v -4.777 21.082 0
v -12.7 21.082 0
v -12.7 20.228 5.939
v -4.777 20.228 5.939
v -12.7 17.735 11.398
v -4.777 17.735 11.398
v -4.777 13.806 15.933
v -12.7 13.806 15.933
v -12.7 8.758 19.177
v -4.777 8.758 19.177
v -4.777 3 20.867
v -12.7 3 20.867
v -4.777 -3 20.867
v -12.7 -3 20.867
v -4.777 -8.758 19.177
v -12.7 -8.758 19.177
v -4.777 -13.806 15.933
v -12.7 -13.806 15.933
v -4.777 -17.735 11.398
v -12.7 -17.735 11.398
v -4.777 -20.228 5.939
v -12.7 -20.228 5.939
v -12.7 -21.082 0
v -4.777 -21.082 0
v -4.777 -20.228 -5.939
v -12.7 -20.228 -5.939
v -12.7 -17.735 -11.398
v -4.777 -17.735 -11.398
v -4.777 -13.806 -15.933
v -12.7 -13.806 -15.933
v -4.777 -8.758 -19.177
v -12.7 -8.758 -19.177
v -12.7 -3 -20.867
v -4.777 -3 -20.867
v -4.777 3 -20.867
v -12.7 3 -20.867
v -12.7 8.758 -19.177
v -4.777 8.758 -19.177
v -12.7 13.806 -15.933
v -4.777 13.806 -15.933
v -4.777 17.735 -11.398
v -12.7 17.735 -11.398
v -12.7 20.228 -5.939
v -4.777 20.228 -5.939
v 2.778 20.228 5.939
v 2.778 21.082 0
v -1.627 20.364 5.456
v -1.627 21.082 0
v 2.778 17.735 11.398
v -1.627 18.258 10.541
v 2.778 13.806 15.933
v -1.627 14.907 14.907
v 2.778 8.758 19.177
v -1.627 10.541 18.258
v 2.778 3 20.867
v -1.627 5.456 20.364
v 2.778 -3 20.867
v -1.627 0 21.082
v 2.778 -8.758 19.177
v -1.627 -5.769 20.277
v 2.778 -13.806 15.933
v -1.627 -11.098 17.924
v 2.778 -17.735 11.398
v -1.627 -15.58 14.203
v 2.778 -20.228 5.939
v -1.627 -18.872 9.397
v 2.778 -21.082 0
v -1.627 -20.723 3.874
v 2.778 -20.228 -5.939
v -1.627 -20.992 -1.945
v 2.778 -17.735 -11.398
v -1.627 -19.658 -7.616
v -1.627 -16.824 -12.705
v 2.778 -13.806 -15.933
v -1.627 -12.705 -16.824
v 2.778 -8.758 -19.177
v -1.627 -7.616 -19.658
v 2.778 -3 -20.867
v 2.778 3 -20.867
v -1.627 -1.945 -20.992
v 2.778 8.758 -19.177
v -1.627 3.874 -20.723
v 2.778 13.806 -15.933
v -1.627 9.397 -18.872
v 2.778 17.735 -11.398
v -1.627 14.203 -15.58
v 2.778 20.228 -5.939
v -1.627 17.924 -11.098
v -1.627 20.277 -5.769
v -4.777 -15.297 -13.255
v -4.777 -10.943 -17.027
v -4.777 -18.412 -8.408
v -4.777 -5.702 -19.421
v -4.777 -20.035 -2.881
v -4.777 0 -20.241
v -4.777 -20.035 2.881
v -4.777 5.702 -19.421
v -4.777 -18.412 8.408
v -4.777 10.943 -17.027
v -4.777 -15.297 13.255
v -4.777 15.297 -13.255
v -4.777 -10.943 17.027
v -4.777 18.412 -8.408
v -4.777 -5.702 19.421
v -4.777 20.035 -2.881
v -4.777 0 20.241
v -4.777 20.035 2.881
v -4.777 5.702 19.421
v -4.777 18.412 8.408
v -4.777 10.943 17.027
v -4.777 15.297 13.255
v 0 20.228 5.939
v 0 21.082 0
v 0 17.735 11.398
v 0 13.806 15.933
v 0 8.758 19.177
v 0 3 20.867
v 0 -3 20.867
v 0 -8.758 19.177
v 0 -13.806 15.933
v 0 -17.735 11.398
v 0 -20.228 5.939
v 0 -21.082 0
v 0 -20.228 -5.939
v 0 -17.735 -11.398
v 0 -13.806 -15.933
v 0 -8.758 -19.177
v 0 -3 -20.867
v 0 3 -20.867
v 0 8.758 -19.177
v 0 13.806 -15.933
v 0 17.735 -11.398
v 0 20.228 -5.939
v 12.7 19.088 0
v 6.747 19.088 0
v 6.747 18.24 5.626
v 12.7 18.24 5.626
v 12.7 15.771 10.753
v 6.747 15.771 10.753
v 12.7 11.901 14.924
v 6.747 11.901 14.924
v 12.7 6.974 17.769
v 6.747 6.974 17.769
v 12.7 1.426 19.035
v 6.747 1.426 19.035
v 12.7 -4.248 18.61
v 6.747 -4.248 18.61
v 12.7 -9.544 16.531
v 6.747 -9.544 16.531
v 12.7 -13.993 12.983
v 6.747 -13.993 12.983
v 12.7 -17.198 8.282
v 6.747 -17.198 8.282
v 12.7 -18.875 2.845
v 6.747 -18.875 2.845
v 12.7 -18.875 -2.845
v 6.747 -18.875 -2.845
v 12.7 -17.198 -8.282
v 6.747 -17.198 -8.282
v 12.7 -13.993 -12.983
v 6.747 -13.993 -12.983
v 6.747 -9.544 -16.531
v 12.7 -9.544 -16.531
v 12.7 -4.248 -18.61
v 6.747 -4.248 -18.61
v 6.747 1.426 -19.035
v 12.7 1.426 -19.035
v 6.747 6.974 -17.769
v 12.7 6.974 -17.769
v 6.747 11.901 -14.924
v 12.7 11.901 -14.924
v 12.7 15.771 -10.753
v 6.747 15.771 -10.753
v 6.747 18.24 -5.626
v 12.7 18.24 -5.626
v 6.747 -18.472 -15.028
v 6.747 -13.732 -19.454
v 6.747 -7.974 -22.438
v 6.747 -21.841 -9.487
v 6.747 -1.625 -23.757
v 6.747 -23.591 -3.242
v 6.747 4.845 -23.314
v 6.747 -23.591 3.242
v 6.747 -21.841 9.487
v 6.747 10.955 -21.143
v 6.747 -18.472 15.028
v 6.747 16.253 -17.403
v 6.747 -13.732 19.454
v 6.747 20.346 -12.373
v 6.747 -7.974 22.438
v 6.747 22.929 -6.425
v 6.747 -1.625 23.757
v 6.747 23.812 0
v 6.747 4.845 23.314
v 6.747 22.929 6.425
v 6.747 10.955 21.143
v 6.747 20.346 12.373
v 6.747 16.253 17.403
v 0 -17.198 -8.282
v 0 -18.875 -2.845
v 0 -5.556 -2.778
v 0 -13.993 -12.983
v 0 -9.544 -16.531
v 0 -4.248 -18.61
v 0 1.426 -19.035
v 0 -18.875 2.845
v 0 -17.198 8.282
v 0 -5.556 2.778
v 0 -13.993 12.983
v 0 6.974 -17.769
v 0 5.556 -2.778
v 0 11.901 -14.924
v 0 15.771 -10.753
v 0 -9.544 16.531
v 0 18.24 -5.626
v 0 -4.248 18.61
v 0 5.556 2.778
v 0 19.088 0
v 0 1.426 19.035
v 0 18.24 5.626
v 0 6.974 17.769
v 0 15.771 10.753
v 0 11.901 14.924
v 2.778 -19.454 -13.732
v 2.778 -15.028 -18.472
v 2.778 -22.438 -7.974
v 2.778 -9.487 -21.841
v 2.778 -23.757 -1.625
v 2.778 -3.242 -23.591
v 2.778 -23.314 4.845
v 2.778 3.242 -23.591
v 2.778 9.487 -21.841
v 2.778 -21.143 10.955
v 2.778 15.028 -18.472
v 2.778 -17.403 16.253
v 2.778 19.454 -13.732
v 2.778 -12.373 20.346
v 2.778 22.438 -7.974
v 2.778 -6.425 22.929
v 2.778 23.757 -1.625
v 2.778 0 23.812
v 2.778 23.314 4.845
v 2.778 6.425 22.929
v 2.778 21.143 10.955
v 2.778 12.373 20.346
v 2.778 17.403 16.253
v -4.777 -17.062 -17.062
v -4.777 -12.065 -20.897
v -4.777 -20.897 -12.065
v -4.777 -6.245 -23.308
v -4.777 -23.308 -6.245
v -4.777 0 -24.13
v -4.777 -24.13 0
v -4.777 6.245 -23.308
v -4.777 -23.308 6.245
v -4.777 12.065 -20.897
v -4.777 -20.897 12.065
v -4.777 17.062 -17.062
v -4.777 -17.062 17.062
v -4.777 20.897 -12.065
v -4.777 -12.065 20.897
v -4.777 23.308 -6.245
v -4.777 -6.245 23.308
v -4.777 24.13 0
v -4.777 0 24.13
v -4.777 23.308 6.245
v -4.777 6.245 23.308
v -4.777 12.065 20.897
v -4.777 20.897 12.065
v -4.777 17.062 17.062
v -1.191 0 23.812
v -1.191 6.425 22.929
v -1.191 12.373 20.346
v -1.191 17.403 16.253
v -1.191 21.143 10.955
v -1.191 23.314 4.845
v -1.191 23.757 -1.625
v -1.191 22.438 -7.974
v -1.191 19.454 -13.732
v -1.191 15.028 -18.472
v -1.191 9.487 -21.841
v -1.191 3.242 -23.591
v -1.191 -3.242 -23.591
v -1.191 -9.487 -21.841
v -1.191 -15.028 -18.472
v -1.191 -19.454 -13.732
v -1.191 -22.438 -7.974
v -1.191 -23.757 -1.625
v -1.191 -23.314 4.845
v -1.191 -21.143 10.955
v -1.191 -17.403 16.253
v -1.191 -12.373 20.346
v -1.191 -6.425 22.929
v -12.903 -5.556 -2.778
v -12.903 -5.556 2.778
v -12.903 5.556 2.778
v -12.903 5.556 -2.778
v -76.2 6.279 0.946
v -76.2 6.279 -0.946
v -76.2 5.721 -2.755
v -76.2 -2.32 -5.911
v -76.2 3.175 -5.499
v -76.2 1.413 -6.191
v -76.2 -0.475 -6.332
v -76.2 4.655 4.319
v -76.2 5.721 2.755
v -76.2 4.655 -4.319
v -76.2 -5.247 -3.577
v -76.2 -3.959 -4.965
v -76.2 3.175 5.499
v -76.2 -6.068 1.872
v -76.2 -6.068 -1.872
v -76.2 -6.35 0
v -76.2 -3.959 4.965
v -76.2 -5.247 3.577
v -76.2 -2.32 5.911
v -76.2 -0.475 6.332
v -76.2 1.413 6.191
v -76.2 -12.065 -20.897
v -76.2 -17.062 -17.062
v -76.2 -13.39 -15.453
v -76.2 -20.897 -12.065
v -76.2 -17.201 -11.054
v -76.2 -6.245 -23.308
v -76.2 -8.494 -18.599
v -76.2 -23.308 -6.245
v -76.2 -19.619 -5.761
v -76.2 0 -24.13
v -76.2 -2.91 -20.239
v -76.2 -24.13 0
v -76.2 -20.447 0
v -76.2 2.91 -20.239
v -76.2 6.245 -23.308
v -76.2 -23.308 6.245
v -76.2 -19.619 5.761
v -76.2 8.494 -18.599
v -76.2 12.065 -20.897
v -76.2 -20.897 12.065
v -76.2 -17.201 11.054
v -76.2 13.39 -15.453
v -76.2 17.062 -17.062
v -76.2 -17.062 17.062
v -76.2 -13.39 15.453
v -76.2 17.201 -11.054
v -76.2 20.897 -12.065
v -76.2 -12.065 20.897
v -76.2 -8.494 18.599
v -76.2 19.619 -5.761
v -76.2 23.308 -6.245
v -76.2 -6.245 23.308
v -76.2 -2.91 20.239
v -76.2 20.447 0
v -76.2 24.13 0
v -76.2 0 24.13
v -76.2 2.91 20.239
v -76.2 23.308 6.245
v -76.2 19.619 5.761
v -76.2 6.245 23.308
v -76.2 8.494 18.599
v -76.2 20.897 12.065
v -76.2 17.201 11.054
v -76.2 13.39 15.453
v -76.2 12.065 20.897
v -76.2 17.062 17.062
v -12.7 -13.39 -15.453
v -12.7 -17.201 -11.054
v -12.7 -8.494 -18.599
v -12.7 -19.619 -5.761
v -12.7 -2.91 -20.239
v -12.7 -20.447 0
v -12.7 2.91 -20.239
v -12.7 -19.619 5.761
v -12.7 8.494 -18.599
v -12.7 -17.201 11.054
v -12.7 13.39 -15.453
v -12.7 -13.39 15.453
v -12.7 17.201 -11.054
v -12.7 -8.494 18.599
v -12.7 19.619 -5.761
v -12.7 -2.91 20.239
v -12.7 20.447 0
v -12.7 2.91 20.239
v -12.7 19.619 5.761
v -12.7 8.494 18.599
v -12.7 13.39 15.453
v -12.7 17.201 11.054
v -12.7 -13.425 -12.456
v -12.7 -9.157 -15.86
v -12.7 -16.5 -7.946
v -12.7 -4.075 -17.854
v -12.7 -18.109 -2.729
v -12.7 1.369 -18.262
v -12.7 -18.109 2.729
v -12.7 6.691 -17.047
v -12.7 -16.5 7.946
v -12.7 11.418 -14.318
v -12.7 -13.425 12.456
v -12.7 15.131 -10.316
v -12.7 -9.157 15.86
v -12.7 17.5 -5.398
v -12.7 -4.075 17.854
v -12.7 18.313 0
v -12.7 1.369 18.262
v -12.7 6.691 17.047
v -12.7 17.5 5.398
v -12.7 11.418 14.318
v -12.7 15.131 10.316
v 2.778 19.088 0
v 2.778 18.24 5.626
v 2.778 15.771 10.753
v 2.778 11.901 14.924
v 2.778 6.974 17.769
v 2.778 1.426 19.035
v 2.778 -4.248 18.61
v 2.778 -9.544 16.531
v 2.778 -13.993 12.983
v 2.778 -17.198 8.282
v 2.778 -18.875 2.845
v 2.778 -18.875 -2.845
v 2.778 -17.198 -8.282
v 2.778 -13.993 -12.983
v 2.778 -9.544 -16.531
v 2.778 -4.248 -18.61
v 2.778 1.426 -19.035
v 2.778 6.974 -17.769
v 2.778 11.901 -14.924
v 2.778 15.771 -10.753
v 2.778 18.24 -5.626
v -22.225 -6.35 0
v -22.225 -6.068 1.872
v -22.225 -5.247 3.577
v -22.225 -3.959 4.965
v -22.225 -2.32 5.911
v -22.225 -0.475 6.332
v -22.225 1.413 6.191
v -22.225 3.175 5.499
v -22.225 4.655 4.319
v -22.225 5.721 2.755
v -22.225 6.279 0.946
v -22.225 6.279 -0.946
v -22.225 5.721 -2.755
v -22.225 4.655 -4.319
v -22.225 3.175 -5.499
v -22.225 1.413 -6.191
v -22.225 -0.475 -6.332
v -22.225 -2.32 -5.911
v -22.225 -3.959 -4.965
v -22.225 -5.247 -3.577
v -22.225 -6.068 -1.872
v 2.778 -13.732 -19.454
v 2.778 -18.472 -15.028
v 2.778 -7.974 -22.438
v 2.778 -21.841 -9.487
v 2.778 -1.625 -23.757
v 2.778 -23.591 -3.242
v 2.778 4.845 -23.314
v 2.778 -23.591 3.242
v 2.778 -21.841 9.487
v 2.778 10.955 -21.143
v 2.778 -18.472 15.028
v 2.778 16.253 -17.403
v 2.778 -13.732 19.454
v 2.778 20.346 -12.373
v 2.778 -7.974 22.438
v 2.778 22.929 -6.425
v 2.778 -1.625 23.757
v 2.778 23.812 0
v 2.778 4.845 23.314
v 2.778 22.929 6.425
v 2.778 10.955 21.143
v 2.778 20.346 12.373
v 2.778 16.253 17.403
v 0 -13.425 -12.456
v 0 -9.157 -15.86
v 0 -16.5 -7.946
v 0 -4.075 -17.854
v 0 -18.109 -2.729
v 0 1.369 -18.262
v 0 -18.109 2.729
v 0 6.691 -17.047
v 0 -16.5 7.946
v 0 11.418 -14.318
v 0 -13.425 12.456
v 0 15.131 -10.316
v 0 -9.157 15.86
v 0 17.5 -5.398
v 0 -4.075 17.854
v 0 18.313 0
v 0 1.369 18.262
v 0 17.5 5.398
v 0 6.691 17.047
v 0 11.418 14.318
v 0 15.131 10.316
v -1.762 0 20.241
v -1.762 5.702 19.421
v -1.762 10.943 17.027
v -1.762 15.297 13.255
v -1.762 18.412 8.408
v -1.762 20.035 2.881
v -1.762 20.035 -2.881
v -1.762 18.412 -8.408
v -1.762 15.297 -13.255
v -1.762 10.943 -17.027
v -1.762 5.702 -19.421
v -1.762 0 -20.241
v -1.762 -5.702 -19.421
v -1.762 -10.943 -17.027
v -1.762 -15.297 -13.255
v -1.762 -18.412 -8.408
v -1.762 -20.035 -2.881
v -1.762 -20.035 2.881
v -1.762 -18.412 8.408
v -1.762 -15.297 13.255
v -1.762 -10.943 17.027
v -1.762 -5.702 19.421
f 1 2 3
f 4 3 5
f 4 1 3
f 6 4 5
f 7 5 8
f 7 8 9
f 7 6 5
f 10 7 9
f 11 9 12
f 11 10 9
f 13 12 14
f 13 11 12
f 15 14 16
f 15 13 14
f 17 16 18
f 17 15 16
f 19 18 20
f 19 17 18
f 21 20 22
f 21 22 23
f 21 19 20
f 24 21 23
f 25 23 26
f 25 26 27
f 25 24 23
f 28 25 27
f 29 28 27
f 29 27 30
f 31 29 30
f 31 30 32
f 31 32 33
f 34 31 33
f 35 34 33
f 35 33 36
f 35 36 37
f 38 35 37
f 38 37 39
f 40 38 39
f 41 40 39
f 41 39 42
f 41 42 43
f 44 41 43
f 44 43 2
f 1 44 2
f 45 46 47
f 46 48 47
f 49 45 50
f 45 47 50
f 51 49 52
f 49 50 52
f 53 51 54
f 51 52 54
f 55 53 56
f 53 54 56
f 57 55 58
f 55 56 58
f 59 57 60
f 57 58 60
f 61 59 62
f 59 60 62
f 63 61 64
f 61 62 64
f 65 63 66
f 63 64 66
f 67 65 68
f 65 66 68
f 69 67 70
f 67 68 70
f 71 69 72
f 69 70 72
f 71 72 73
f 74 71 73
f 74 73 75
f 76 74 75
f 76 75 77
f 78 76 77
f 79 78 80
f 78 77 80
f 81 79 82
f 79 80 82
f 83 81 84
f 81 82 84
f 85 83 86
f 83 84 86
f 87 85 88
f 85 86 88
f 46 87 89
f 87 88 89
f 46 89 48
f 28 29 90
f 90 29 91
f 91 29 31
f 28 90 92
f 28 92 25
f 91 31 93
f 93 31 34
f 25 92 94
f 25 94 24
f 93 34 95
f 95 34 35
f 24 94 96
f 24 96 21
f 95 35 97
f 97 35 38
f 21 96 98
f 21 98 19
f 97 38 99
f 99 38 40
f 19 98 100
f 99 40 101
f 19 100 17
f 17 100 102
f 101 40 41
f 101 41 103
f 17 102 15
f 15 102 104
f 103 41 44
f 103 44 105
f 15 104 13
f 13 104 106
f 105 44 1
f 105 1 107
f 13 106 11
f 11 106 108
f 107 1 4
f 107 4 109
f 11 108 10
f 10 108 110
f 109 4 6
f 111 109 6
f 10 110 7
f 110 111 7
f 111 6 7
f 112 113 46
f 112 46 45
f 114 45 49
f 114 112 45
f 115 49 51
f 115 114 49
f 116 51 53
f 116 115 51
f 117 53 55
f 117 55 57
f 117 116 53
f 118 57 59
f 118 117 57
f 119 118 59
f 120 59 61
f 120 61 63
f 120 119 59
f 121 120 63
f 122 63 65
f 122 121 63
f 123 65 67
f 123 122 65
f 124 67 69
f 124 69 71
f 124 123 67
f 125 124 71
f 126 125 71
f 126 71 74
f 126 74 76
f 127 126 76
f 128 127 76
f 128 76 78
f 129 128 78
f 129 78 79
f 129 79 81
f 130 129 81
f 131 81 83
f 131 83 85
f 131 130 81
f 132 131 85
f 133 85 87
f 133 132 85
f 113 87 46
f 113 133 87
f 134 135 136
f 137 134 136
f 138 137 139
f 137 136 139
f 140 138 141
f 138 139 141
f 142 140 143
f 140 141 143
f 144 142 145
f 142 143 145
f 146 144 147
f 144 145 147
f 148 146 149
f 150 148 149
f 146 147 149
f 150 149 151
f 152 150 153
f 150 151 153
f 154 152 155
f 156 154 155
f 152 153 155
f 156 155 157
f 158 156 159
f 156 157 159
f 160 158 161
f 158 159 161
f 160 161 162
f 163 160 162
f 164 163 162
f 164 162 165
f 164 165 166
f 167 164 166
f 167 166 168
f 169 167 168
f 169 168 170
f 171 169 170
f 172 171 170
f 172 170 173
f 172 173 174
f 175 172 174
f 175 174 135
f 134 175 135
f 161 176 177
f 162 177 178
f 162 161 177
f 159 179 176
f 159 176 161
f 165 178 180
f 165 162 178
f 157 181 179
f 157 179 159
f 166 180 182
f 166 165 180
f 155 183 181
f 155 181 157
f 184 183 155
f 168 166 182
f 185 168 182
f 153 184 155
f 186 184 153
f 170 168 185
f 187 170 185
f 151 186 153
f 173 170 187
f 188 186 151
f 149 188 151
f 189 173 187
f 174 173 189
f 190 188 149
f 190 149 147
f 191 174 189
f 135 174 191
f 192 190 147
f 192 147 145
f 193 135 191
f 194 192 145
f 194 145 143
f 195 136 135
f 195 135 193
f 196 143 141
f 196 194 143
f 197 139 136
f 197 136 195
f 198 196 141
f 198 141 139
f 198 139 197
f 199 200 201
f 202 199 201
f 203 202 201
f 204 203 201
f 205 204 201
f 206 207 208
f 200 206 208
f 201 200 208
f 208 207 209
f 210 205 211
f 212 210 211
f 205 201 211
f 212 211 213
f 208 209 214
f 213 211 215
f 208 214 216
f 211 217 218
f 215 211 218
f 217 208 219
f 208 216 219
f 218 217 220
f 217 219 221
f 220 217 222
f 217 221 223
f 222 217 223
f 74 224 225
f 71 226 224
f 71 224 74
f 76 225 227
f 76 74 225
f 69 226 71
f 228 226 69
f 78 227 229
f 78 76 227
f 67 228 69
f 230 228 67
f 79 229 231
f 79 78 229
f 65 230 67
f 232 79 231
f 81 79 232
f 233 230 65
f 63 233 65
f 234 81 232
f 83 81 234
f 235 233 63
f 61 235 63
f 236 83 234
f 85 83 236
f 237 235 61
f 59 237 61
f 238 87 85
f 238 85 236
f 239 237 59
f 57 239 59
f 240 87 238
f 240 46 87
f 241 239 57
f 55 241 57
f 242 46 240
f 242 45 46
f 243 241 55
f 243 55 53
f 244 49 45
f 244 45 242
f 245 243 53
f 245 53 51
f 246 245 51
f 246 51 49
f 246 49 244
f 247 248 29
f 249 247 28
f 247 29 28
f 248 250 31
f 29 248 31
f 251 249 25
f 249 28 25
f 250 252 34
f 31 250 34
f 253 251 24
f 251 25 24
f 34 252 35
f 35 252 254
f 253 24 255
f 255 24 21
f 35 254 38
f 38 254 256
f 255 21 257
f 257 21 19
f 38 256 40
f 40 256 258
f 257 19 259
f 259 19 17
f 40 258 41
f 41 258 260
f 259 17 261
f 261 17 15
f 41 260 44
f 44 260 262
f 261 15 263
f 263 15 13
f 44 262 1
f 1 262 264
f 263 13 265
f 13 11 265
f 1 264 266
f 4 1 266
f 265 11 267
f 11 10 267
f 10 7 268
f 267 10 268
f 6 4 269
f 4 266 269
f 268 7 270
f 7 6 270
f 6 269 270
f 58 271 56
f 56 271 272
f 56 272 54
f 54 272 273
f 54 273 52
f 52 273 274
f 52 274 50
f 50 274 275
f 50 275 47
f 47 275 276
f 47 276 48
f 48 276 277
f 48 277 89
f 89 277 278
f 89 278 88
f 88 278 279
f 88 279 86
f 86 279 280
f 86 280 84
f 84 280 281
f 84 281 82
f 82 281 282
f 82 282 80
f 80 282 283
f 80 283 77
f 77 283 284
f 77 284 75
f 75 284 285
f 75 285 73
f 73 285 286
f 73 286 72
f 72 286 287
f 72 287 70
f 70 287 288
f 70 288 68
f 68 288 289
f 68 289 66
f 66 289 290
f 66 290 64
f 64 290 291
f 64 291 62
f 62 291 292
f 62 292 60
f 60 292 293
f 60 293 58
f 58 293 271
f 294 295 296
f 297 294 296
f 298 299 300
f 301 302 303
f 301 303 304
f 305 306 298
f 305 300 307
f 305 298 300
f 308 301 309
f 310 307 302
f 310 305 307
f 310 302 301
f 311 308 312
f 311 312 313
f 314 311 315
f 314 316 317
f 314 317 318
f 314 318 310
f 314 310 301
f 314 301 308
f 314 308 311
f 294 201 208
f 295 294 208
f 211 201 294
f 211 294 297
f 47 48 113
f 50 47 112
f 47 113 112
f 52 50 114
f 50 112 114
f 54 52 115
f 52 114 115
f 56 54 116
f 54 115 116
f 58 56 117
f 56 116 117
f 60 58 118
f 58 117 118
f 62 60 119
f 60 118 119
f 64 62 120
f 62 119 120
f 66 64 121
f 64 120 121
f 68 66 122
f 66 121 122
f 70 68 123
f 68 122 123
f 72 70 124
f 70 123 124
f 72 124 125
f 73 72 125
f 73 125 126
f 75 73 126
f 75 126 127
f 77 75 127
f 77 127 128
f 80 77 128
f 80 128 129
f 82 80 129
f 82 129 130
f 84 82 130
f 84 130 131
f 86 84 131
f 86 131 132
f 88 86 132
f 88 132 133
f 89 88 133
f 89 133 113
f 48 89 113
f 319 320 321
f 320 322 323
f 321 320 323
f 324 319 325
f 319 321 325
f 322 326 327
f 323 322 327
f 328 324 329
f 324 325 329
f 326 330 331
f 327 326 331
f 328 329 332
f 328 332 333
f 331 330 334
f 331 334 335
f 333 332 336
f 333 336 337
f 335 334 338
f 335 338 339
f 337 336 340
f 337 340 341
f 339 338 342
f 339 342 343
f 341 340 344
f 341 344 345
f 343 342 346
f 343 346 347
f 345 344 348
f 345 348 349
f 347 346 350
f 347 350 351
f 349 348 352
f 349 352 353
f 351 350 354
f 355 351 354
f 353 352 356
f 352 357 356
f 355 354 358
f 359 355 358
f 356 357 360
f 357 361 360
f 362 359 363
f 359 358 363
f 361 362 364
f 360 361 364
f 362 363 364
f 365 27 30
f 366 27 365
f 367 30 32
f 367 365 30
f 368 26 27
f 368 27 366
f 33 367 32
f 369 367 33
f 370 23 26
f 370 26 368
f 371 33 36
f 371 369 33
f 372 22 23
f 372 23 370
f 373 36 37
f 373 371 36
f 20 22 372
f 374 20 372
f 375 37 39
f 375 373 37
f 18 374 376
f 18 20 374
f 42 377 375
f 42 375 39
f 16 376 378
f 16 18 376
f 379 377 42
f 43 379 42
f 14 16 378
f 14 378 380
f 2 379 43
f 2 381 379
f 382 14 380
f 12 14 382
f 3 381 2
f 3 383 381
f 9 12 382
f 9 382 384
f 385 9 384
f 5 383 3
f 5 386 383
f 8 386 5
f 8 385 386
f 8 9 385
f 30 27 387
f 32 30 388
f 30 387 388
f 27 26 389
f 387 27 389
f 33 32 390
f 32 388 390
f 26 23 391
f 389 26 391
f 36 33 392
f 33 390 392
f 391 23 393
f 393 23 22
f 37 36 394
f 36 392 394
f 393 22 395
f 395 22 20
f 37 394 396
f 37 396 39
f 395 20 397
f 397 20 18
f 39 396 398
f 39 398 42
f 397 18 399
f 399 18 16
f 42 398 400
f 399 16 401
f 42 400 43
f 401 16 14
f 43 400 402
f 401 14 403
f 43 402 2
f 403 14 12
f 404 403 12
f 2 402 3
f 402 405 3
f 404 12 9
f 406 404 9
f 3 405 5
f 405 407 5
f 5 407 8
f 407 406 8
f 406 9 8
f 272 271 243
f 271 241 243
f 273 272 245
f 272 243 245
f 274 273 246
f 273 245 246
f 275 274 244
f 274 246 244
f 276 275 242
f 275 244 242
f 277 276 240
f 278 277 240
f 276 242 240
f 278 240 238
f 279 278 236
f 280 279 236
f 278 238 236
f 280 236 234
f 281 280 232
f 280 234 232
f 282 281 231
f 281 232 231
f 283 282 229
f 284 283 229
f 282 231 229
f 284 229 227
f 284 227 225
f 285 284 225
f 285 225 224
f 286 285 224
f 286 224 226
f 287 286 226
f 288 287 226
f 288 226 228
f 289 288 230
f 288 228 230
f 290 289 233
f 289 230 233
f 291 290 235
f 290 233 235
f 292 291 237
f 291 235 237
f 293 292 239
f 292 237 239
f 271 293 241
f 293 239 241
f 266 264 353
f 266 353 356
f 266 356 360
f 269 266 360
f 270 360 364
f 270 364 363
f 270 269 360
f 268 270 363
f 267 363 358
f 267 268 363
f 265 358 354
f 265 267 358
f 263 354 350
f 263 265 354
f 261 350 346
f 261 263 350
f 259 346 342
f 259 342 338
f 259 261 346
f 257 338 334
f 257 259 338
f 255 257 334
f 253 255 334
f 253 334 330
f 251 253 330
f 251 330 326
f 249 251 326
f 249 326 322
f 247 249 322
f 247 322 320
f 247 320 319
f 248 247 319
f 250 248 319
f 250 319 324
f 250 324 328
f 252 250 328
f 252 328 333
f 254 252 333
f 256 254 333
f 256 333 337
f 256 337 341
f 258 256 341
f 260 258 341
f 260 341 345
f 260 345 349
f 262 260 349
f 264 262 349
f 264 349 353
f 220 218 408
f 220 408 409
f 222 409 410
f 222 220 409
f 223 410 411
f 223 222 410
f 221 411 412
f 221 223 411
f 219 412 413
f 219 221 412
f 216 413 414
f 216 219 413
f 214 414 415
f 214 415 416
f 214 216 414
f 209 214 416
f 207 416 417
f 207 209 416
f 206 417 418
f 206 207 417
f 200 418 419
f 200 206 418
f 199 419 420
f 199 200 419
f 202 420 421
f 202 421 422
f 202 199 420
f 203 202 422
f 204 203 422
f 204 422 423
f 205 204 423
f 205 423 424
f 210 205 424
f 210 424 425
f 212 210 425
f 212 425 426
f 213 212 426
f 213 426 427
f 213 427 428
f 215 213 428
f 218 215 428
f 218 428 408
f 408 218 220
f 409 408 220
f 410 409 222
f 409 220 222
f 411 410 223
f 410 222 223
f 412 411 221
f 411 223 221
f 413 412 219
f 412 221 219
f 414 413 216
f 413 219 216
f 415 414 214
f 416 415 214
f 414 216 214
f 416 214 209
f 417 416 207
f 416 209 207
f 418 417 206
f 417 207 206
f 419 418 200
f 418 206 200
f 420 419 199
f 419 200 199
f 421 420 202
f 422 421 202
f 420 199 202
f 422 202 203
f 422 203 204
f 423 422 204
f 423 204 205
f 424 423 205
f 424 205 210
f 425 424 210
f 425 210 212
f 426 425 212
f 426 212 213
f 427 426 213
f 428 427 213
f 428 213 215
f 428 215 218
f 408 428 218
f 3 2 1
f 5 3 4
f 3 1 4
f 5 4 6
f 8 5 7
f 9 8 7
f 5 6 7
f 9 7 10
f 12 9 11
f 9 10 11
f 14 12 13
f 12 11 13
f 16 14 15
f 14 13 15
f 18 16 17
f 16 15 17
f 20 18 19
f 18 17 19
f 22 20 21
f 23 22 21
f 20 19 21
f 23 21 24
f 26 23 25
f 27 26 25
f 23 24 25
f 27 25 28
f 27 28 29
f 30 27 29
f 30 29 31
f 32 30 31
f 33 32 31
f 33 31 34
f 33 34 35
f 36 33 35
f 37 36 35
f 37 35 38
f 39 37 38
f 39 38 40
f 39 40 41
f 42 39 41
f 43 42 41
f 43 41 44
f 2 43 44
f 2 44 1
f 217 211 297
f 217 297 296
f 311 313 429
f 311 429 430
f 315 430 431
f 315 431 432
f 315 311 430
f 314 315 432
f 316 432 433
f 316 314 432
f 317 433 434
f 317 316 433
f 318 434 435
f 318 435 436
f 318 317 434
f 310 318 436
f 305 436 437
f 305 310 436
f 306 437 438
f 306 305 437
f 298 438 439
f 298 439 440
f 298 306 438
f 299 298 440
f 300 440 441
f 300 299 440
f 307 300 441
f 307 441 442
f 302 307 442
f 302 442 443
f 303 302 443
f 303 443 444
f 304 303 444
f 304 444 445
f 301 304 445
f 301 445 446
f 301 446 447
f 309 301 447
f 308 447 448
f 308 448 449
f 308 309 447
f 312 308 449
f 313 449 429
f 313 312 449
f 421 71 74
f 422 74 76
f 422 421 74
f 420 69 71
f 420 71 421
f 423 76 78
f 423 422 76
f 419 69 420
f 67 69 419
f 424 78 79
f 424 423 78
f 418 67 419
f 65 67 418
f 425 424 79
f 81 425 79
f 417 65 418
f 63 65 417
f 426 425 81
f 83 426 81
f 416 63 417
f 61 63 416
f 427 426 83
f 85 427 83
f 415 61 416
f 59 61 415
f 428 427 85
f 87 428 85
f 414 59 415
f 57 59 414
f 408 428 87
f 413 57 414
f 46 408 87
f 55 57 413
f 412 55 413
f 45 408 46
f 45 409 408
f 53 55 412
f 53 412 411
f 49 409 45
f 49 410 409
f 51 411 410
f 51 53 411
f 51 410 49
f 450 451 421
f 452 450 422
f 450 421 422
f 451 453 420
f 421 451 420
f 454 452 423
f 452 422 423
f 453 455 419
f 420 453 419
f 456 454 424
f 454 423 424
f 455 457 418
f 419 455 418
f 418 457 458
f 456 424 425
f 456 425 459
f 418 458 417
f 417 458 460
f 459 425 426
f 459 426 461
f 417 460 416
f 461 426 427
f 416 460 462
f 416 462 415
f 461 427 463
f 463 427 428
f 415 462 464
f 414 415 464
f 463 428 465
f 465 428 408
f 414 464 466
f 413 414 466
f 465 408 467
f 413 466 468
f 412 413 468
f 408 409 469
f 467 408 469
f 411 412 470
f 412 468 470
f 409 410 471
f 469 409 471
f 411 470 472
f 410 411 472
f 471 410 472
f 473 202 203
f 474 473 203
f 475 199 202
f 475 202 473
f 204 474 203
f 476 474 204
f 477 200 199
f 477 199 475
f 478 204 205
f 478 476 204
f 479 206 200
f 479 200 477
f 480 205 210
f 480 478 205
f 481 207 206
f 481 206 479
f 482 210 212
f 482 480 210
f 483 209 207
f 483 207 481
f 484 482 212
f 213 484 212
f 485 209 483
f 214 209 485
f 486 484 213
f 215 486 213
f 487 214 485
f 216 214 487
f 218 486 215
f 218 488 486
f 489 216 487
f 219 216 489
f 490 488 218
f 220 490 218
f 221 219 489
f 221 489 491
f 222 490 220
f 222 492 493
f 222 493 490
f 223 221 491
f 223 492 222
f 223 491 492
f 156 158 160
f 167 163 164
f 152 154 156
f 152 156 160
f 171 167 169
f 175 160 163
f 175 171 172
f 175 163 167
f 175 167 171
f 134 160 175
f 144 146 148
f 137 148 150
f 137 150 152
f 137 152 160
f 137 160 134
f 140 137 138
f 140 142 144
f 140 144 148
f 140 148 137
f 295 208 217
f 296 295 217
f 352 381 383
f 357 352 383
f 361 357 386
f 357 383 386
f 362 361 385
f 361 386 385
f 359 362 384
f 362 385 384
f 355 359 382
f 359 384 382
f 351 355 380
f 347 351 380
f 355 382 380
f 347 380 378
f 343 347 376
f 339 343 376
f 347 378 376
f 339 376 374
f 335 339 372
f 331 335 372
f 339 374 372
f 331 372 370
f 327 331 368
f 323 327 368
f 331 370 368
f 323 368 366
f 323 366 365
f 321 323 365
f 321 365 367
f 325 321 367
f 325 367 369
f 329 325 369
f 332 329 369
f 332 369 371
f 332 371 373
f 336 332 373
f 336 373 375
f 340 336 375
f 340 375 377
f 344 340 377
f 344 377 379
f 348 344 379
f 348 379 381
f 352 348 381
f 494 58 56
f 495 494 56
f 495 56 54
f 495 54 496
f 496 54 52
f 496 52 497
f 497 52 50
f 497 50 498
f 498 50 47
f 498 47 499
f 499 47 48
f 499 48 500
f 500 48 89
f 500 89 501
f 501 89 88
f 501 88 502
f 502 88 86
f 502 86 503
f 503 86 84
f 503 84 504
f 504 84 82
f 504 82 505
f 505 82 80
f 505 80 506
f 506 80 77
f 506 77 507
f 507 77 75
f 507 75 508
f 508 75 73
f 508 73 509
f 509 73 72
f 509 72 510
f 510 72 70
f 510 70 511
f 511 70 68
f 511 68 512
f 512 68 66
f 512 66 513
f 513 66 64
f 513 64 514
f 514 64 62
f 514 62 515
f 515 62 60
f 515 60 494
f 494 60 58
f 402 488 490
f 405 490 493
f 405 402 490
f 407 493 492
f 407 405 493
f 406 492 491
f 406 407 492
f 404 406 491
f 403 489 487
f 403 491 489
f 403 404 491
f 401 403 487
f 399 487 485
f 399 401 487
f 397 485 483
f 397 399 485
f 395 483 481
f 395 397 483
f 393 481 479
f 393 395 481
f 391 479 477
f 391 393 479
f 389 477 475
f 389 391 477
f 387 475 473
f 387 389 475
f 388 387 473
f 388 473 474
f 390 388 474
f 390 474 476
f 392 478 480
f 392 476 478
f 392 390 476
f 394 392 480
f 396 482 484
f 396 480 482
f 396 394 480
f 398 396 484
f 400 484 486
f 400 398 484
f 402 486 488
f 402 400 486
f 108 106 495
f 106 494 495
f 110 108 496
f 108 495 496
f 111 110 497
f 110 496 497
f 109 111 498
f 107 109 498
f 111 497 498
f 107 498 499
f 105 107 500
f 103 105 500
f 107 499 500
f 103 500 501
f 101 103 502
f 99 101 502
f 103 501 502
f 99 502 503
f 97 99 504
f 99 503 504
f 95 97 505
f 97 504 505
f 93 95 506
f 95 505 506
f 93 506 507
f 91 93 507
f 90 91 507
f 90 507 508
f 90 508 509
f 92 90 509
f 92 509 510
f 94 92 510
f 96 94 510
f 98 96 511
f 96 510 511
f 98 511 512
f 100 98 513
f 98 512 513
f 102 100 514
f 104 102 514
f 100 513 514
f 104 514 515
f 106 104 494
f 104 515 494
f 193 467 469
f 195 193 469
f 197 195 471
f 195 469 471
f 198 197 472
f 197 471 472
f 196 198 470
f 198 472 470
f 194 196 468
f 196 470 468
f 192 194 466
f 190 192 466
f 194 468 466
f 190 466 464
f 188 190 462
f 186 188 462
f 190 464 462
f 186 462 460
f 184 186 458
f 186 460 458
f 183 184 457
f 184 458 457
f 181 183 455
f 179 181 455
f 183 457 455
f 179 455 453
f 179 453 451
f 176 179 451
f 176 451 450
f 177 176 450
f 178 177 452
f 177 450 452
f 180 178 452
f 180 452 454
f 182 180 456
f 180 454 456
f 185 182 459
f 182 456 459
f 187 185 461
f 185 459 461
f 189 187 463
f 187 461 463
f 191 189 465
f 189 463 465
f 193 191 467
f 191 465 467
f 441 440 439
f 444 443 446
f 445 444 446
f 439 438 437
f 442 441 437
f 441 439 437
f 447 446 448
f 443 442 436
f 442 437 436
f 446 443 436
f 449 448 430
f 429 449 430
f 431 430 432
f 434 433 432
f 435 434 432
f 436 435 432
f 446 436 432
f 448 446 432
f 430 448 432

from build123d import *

# Parameters (mm, degrees)
F0_W          = 11.1125
F0_H          = 5.55625
F2_DEPTH      = 12.9032
F0_R          = 19.0881
F3_DEPTH      = 12.7
F4_START      = 2.778125
F0_R_2        = 23.8125
F0_R_3        = 22.621875
F4_DEPTH      = 3.96875
F1_R          = 24.13
F1_R_2        = 21.082
F1_R_3        = 20.447
F5_DEPTH      = 76.2
F5_DEPTH_BACK = 2.778125
F1_R_4        = 18.3134
F6_DEPTH      = 12.7
F6_DEPTH_BACK = 2.778125
F11_R         = 6.35
F12_DEPTH     = 53.975


with BuildPart() as f2:
    # F0 (on Right) → F2 (new body)
    with BuildSketch(Plane.YZ):
        Rectangle(F0_W, F0_H)
    extrude(amount=-F2_DEPTH)

    # F0 (on Right) → F3 (join)
    with BuildSketch(Plane.YZ):
        Circle(F0_R)
        Rectangle(F0_W, F0_H, mode=Mode.SUBTRACT)
        Rectangle(F0_W, F0_H)
    extrude(amount=F3_DEPTH)

    # F0 (on Right) → F4 (join)
    with BuildSketch(Plane.YZ.offset(F4_START)):
        Circle(F0_R_2)
        Circle(F0_R_3, mode=Mode.SUBTRACT)
        Circle(F0_R_3)
        Circle(F0_R, mode=Mode.SUBTRACT)
        Rectangle(F0_W, F0_H)
    extrude(amount=F4_DEPTH)


with BuildPart() as f5:
    # F1 (on Right) → F5 (new body, two sides)
    with BuildSketch(Plane.YZ) as f5_sk:
        Circle(F1_R)
        Circle(F1_R_2, mode=Mode.SUBTRACT)
        Circle(F1_R_2)
        Circle(F1_R_3, mode=Mode.SUBTRACT)
    extrude(amount=-F5_DEPTH)
    extrude(f5_sk.sketch, amount=F5_DEPTH_BACK)


with BuildPart() as f6:
    # F1 (on Right) → F6 (new body, two sides)
    with BuildSketch(Plane.YZ) as f6_sk:
        Circle(F1_R_2)
        Circle(F1_R_3, mode=Mode.SUBTRACT)
        Circle(F1_R_3)
        Circle(F1_R_4, mode=Mode.SUBTRACT)
    extrude(amount=-F6_DEPTH)
    extrude(f6_sk.sketch, amount=F6_DEPTH_BACK)


with BuildPart() as f5_1:
    add(f5.part)

    # F7: cut F6
    add(f6.part, mode=Mode.SUBTRACT)


with BuildPart() as f9_tool:
    # F8 (on Front) → F9 (revolve)
    with BuildSketch(Plane.XZ):
        Polygon((-1.190625, 23.8125), (2.778125, 23.8125), (2.778125, 26.590625), (-4.7770133242, 26.590625), (-4.7770133242, 20.240625), (-1.7616940895, 20.240625), align=None)
    revolve(axis=Axis((0.5718530156, 0, 0), (-1, 0, 0)))


with BuildPart() as f5_2:
    add(f5_1.part)

    # F9: cut by f9_tool
    add(f9_tool.part, mode=Mode.SUBTRACT)


with BuildPart() as f6_1:
    add(f6.part)

    # F9: cut by f9_tool
    add(f9_tool.part, mode=Mode.SUBTRACT)

    # F10: cut F2
    add(f2.part, mode=Mode.SUBTRACT)


with BuildPart() as f12:
    # F11 (on face) → F12 (new body)
    with BuildSketch(Plane(origin=(-76.2, 0, 0), x_dir=(0, -1, 0), z_dir=(-1, 0, 0))):
        Circle(F11_R)
    extrude(amount=-F12_DEPTH)


solid = Compound([f2.part, f5_2.part, f6_1.part, f12.part])
